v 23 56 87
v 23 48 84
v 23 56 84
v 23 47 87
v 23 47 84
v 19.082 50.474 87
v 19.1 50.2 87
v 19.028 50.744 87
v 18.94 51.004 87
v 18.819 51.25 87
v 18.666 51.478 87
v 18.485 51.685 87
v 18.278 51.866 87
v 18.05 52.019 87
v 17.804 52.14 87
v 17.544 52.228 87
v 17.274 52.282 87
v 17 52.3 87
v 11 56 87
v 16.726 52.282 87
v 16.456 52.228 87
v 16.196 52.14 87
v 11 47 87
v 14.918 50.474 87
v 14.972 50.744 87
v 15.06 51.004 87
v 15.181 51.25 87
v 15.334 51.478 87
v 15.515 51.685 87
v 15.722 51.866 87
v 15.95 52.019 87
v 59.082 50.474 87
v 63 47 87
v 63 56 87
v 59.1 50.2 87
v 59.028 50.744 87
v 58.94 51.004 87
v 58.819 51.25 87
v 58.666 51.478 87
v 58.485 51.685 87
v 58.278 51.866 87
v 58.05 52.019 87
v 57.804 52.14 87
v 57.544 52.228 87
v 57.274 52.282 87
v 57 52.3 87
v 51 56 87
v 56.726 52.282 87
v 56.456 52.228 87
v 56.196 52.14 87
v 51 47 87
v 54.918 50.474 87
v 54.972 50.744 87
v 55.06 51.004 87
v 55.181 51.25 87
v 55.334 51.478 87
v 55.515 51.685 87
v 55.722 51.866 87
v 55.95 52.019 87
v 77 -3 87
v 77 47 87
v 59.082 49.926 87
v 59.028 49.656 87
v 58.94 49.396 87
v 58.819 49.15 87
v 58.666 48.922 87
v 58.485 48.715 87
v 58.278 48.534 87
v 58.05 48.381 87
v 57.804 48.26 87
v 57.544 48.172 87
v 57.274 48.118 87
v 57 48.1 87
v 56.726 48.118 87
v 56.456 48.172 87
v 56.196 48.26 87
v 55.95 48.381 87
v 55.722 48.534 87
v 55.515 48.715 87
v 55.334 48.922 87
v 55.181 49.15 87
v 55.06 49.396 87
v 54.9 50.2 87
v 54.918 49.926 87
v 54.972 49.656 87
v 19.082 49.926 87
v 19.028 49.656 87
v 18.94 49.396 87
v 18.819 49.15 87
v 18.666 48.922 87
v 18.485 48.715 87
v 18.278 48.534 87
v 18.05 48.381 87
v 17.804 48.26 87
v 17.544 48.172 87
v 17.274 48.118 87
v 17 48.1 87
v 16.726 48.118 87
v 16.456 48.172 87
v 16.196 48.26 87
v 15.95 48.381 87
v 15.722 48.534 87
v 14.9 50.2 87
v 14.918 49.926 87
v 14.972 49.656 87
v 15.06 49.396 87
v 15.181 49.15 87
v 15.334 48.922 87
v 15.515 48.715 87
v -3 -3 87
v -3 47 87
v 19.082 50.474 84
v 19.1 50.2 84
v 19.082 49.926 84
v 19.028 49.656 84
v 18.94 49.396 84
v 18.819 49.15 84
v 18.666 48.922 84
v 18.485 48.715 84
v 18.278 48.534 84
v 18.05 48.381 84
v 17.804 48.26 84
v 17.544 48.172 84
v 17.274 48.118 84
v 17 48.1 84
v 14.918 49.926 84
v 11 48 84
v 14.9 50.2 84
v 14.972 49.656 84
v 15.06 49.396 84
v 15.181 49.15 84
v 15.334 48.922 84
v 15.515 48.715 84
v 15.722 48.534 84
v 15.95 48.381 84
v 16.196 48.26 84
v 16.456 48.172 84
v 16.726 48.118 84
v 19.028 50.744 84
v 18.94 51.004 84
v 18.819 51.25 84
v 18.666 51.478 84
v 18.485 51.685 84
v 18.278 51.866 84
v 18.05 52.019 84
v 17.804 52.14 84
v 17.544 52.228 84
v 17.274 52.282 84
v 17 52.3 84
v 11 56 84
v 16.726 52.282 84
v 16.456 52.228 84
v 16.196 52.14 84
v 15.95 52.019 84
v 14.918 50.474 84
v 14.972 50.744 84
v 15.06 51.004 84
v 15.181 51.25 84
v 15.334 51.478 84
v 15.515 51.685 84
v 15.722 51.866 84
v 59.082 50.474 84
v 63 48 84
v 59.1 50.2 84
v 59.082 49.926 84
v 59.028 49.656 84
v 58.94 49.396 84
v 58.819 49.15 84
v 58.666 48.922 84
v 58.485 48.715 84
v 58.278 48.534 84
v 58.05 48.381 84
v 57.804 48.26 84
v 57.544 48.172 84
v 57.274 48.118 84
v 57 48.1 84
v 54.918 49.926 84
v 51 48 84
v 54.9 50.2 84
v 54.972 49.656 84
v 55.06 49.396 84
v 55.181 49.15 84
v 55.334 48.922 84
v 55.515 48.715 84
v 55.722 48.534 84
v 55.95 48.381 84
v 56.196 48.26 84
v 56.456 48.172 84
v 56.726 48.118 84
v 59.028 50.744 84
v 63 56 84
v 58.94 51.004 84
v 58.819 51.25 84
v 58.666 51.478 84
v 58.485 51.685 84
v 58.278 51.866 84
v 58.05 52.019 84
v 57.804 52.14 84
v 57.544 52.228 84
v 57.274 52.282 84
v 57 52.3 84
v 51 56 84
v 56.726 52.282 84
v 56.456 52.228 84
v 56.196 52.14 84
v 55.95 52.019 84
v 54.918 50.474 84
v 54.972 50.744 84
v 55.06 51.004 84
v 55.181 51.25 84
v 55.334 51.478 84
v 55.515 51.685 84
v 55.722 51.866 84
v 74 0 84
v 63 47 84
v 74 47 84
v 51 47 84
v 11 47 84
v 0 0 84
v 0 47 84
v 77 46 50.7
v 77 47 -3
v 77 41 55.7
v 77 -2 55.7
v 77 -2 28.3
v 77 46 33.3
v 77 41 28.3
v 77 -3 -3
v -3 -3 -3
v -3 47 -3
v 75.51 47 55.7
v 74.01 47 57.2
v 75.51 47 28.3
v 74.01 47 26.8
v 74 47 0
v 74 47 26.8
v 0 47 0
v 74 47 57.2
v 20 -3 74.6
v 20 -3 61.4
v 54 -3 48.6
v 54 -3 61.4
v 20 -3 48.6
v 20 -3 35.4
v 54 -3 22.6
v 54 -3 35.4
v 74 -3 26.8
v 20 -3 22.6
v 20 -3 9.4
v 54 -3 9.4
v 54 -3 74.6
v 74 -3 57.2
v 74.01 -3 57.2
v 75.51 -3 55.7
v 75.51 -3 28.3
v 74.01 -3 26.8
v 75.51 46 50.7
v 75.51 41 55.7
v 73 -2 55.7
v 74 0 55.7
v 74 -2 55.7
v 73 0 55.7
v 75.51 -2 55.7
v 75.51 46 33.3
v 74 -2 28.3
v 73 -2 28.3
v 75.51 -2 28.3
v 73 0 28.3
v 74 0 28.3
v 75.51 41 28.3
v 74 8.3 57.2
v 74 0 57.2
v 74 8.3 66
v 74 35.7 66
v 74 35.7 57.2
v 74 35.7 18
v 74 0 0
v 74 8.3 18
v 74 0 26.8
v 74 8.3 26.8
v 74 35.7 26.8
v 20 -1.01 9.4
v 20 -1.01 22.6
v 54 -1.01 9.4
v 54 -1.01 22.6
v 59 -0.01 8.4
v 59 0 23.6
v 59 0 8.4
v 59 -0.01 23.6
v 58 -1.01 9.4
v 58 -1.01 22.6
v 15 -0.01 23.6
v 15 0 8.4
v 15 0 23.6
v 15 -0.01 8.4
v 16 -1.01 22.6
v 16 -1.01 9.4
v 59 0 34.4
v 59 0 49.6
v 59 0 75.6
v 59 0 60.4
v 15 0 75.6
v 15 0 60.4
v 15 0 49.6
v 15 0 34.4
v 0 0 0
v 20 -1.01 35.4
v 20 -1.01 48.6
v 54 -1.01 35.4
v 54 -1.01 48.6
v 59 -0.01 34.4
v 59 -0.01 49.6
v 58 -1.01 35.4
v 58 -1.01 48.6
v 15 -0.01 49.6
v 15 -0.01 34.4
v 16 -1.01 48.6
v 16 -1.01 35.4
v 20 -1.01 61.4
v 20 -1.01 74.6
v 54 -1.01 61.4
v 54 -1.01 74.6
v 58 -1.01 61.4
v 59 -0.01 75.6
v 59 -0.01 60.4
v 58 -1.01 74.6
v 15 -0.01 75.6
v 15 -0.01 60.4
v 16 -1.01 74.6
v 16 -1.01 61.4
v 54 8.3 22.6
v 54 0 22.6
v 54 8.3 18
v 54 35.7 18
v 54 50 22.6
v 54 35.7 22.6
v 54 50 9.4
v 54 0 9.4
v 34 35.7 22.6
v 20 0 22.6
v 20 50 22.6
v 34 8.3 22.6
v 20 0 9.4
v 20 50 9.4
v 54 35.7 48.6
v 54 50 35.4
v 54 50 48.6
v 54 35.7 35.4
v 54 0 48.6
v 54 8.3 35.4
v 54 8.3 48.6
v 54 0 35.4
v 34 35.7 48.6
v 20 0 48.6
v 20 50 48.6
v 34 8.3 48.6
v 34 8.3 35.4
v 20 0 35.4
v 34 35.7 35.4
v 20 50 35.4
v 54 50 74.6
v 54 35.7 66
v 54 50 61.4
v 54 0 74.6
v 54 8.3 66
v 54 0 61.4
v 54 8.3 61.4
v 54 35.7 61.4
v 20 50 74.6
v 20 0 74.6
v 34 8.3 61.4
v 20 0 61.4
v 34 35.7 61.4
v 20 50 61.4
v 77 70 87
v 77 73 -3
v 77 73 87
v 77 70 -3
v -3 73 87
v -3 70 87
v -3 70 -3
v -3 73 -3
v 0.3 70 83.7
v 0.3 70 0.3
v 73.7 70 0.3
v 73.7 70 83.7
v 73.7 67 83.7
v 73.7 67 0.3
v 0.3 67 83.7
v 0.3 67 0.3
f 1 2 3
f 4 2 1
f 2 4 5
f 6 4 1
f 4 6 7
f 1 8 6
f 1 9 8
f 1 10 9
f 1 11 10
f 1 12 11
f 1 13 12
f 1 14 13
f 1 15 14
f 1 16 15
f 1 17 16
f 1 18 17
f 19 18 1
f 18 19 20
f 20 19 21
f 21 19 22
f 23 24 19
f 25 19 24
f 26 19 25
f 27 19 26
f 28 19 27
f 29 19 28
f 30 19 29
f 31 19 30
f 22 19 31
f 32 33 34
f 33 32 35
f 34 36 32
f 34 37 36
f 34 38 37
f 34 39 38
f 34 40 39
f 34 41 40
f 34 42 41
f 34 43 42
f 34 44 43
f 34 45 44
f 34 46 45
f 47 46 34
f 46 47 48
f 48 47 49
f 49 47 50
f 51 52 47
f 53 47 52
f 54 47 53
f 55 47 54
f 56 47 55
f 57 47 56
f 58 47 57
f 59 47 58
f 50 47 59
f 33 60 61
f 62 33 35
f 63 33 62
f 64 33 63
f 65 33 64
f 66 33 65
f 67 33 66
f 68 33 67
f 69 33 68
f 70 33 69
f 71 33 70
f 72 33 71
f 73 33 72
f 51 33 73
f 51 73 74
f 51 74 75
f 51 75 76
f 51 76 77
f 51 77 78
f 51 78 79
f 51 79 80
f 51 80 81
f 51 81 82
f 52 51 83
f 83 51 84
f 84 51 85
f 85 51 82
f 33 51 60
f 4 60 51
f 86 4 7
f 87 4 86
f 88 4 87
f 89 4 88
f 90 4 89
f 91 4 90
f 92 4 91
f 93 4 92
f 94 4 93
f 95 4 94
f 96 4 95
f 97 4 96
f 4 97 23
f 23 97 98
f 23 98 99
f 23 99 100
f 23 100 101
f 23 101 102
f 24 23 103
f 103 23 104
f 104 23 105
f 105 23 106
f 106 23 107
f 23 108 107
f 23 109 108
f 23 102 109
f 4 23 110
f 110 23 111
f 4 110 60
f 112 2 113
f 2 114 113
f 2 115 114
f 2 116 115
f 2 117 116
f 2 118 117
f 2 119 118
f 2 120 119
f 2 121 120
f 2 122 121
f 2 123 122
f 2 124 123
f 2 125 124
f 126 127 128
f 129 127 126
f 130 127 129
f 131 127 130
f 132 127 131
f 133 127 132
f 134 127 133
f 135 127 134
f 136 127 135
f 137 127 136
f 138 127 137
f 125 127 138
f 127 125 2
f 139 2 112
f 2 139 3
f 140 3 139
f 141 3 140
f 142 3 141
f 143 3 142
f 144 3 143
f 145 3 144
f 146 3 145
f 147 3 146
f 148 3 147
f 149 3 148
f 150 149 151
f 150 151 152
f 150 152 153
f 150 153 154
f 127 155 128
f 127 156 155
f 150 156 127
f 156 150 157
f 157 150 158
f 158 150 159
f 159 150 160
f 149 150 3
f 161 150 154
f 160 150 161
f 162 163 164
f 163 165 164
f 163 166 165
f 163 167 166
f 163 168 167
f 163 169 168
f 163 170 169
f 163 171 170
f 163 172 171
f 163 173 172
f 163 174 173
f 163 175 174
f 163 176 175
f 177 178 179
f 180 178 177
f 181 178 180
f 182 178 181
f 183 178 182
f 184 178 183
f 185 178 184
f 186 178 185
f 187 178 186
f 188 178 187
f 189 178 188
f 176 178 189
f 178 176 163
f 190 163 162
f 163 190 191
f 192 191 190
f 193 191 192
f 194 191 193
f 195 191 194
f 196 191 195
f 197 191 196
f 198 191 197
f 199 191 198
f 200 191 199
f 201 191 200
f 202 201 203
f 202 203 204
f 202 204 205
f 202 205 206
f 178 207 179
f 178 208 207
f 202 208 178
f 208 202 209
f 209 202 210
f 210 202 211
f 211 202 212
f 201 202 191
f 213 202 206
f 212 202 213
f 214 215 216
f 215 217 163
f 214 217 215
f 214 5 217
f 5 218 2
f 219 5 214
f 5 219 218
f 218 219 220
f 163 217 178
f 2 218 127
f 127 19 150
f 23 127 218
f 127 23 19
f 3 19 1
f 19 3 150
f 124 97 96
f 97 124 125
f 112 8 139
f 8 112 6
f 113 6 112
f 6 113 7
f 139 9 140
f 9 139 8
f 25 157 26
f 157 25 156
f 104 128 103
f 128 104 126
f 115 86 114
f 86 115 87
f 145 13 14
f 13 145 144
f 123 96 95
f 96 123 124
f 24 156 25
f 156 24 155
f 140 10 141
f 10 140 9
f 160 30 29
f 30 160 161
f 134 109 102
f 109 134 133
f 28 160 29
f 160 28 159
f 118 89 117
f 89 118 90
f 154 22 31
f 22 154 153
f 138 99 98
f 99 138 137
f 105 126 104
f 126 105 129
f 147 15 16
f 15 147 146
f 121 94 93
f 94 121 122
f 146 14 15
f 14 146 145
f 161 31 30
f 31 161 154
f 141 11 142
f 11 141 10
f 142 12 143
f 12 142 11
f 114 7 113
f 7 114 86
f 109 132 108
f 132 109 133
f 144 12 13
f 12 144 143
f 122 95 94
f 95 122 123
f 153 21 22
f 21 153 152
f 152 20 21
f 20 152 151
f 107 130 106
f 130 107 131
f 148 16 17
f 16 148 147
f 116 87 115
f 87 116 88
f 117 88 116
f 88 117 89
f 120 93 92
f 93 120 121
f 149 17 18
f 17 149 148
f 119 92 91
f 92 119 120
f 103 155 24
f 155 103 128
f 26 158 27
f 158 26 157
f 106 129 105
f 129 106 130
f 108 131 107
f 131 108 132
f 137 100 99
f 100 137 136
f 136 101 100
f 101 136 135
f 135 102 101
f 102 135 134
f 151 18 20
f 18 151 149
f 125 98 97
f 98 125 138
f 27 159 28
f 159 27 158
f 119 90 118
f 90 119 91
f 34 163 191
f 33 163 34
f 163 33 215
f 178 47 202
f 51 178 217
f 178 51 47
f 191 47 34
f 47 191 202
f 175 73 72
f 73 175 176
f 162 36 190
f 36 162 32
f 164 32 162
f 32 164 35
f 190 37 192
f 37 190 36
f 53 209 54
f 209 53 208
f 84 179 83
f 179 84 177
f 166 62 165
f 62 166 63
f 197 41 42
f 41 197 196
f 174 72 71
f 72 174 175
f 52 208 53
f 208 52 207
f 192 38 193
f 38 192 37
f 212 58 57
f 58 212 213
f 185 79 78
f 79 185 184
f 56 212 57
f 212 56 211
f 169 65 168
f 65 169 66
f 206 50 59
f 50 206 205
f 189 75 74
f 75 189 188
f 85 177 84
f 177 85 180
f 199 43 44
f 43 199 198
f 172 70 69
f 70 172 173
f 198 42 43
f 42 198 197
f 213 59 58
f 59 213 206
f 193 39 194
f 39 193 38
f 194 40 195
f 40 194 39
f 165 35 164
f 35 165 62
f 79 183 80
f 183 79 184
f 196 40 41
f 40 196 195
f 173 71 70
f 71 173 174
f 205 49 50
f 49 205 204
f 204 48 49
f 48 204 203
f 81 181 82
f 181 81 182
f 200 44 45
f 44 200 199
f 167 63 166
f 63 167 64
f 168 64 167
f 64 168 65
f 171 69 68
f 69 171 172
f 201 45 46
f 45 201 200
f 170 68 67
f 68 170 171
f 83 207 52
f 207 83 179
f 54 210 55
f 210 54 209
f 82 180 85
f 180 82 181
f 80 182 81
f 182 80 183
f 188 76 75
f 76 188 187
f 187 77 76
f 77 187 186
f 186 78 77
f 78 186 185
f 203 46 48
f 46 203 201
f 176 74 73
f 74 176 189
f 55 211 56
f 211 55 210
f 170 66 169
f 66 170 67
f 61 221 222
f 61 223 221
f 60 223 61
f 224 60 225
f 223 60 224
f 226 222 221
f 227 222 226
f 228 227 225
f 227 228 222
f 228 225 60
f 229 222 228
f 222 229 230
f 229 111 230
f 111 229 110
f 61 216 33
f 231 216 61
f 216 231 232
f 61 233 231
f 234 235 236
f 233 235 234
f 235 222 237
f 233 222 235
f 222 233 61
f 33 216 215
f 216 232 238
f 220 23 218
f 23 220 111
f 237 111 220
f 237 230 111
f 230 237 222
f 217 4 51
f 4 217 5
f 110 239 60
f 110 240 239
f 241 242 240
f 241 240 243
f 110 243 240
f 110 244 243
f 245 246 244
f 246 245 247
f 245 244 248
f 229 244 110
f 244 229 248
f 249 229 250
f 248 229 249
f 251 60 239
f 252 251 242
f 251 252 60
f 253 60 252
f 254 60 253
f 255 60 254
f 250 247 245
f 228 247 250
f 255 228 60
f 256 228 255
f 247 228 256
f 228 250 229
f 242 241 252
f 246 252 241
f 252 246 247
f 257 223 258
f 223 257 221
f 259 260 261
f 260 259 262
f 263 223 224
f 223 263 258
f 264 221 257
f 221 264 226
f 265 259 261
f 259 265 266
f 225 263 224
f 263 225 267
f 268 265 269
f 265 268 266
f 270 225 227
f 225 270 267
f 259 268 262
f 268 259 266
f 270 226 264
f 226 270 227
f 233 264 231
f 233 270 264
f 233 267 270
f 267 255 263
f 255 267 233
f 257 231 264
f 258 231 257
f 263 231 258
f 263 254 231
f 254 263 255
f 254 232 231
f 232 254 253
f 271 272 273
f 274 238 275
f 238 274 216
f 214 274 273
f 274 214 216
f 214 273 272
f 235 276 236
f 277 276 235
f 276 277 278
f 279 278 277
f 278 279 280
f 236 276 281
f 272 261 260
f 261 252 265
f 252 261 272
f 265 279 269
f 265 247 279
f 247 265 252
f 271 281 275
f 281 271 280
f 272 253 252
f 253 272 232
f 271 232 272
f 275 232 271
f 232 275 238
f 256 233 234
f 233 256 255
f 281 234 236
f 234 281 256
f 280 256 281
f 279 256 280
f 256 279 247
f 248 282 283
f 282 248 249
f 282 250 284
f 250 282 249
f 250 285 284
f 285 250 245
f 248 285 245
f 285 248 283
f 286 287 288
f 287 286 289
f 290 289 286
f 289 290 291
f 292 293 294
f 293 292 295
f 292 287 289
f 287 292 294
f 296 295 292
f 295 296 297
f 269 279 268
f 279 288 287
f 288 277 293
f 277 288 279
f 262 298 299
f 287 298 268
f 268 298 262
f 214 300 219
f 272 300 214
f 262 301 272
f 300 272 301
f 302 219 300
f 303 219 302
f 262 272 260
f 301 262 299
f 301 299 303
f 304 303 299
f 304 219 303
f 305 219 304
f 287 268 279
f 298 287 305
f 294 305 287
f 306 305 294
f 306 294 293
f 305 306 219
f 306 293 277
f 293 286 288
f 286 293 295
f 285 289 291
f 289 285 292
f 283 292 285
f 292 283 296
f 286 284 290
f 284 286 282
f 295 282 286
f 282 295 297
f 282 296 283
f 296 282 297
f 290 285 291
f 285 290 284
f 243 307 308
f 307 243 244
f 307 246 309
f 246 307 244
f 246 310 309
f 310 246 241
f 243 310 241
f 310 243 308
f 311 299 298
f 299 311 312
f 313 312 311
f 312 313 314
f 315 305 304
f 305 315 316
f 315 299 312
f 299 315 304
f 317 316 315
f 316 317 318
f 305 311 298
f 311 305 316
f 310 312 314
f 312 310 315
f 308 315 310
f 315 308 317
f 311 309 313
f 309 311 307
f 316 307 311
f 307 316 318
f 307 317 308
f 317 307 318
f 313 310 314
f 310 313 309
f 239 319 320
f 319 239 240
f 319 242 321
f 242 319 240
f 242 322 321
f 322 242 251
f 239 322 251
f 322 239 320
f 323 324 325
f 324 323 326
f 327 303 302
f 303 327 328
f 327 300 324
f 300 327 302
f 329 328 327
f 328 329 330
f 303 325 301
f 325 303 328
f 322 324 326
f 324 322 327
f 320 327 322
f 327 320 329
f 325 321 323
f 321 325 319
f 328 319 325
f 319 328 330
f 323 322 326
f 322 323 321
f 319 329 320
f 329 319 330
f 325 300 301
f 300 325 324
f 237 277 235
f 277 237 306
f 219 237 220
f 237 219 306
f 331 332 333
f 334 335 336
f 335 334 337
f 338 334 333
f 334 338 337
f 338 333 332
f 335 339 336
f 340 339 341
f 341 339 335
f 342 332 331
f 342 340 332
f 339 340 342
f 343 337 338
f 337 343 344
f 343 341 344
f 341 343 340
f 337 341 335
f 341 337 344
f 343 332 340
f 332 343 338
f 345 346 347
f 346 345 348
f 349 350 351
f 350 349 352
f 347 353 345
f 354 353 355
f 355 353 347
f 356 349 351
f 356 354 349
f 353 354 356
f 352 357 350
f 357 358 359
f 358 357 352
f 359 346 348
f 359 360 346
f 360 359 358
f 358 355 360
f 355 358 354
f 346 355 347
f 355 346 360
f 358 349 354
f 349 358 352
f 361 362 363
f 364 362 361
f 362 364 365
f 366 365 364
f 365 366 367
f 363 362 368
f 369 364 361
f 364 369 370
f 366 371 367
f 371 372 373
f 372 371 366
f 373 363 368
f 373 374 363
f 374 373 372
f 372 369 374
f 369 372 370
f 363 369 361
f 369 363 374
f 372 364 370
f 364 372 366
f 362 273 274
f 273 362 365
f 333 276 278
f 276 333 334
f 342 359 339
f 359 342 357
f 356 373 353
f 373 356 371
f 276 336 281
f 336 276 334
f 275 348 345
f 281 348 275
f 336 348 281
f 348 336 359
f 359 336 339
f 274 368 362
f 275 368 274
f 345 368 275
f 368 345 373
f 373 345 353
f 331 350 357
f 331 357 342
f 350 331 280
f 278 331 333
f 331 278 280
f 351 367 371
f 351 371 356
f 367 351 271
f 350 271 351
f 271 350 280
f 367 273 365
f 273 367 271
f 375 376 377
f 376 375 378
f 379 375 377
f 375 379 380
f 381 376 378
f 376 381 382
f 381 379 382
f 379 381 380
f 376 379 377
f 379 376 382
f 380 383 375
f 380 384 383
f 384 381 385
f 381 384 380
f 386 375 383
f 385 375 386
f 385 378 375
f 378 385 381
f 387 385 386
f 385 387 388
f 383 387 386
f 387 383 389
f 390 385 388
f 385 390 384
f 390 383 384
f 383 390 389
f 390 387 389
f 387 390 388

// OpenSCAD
// file: schaltbox_parts.scad
// Mains switch box for the photo lamp -- part facts, in one place.
//
// Only the SSR is taken from a datasheet; everything else has to be measured on
// the parts actually bought, because "Euro socket" and "fuse holder" name a
// shape, not a size. Every value marked MESSEN is a placeholder that will not
// fit your parts by luck. Measure once, change here, and the whole box follows.

// --- Panasonic/Matsushita AQ2A2-ZP3 -----------------------------------------
// Verified against ds_61601_0001_en_aq1, "AC output, 2A and 3A types (Vertical)".
// Pins in one row: 1,2 = load (LAST), 3,4 = input (STEUERUNG).
ssr_body_v  = [33, 10, 25];   // vertical type, length x width x height
ssr_body_f  = [33, 25, 11];   // AQ2A2-J, the flat one
ssr_pin_d   = 0.8;
ssr_pitches = [7.62, 12.7, 5.08];  // 1->2, 2->3, 3->4; 25.4 in total
ssr_pin_len = 5.3;            // below the body

// --- Screw terminals, 5.08 mm pitch -----------------------------------------
// MESSEN: body depth and height vary by make; the width follows the pitch.
term_pitch  = 5.08;
term_depth  = 10.0;           // MESSEN: front to back on the board
term_height = 10.5;           // MESSEN: above the board
term_2p_w   = 2 * term_pitch + 2.2;   // ~12.4
term_3p_w   = 3 * term_pitch + 2.2;   // ~17.4

// --- The little board -------------------------------------------------------
// A strip of perfboard is enough: 2-pole terminal | SSR | 3-pole terminal, in a
// row, because that is the order the SSR's own pins impose.
pcb          = [70, 30, 1.6];
pcb_hole_d   = 3.2;
pcb_inset    = 4;             // hole centres from the edges
pcb_standoff = 6;             // board sits this high above the floor

// --- IEC inlet with fuse holder and switch, snap-in -------------------------
// Measured on the part. This one piece replaces what used to be three: the
// mains entry, the fuse holder and a switch. The two chamfered corners sit at
// one SHORT side -- they are the orientation key, and putting them on the long
// side would make an opening the part does not go into.
iec_cut        = [48, 27.4];  // Gesamtabmessung, Fasen eingerechnet
iec_flange     = [51, 31];    // the visible frame; only 1.45 mm wider per side,
                              // so the cutout has to be accurate and the wall flat
iec_chamfer    = 5;
iec_key_flip   = false;       // which short side carries the chamfers
// Soldering instead of push-on connectors buys depth: 29 instead of 40 for the
// inlet, 35 instead of 50 for the sockets. It also gives up something -- a
// soldered joint on a flat tab is more brittle than a crimp, and this box gets
// carried to venues. "flachstecker" is therefore the default.
connection     = "flachstecker";   // "flachstecker" | "loeten"
iec_depth      = (connection == "loeten") ? 29 : 40;
iec_snap_wall  = 1.5;         // the snaps grip a wall no thicker than this
iec_snap_edge  = "long";      // which pair of cutout edges the snaps sit on

// --- Euro sockets, snap-in --------------------------------------------------
socket_cut       = [13.2, 34];   // snaps on the narrow sides
socket_flange    = [20, 44];     // sets the box height: the frame has to sit on
                                 // the wall, not hang over its edge
// Turned flat the sockets make a wide, low box instead of a narrow, tall one.
// The plug then goes in with its pins side by side and its cable leaves
// sideways -- worth thinking about before printing.
socket_upright   = true;
socket_depth     = (connection == "loeten") ? 35 : 50;
socket_snap_wall = 2.0;
socket_gap       = 10;        // free space between two cutouts
socket_count     = 3;

// A snap-in part wants a thin panel, a mains enclosure wants a thick wall. So
// the wall stays 3 mm and is thinned only around each opening, with 45-degree
// sides: a step there would be a ceiling the printer has to bridge.
snap_margin      = 4;         // how far the thinned area reaches past the cutout

// --- Control lead ------------------------------------------------------------
// Its own hole on the other side of the rib, so 3.3 V never shares a run with
// 230 V. The mains no longer needs one: it arrives through the inlet.
ctrl_hole_d      = 7.0;

// --- The box itself ---------------------------------------------------------
// Given, not derived: the box size is the requirement, so the parts are checked
// against it instead of setting it. Layout follows the second sketch: the three
// Euro sockets sit in a column on the front (the x-z face at y = 0), the inlet
// stands upright on the right (the y-z face at x = inner). The lid is the back,
// so taking it off opens everything at once.
box = [80, 50, 90];

// The vertical SSR needs 6 + 1.6 + 25 = 32.6 mm above its floor. There is not
// that much room left over the built-in parts, so the board is optional -- see
// the fit report the file echoes when it renders.
with_pcb = false;

// The flat variant AQ2A2-J-ZP3 is 33 x 25 x 11 instead of 33 x 10 x 25.
ssr_flat = false;

// --- Print and assembly -----------------------------------------------------
// 3 mm is the floor, not a target: an FDM wall is porous along the layer lines
// and is not the insulation a moulded one of the same thickness would be.
wall        = 3.0;
floor_t     = 3.0;
lid_t       = 3.0;
clearance   = 0.3;            // printing play, per side
screw_d     = 3.0;            // lid screws, self-tapping into the bosses
screw_pilot = 2.5;
boss_d      = 8.0;
ear_hole_d  = 4.2;            // mounting into the Fotobox enclosure
ear_len     = 12;

// Mains parts must keep their distance from anything a finger can reach. The
// print is a holder, not the insulation -- sleeve the live parts as well.
creep_gap   = 8.0;
// main file
// Mains distribution box for the Fotobox, with the switch for the photo lamp.
//
// A bar of 50 x 60 x 120 mm. The underside carries the IEC inlet -- which
// brings mains, fuse and main switch in one part -- and one Euro socket, in
// line. The left side carries the other two Euro sockets, also in line. The lid
// is the long face opposite the left side, so taking it off opens the whole bar
// sideways and both groups of sockets are reachable.
//
// The box size is given, not derived. Every part is therefore checked against
// it and the file says what fits and what does not when it renders.
//
// x runs along the 120 mm length, y from the left side towards the lid, z from
// the underside upwards. Origin is the inner corner at the underside/left end.

include <schaltbox_parts.scad>

part = "beides";   // "unterteil" | "deckel" | "beides" | "explosion"
$fn = 48;

// --- derived ----------------------------------------------------------------

inner = [box[0] - 2 * wall, box[1] - 2 * wall, box[2] - 2 * wall];
ssr_body = ssr_flat ? ssr_body_f : ssr_body_v;

// Sockets sit in a column on the front: the 44 mm side of the frame runs across
// the width, the 20 mm side stacks up the height.
sock_w  = socket_cut[1];     // 34, across the width
sock_h  = socket_cut[0];     // 13.2, up the height
sfl_w   = socket_flange[1];  // 44
sfl_h   = socket_flange[0];  // 20

sock_x  = inner[0] / 2;
sock_pitch = max(sfl_h + 6, sock_h + 10);
sock_z  = [for (i = [0 : socket_count - 1])
              (inner[2] - (socket_count - 1) * sock_pitch) / 2 + i * sock_pitch];

// The inlet stands upright on the right wall: 48 mm up, 27.4 across the depth.
iec_z   = inner[2] / 2;

// What is left over beside the socket column. The frame sits outside, so what
// counts in here is the body, which has to pass through the cutout -- plus a
// couple of millimetres in case it flares behind the panel.
free_w  = (inner[0] - sock_w - 4) / 2;

pcb_x0 = (inner[0] - pcb[0]) / 2;
pcb_z0 = socket_depth + 2;          // above whatever the underside parts occupy

// --- fit report -------------------------------------------------------------
// Printed on every render. A box with a given size can only be honest about
// what does not go in.

free_behind = inner[1] - socket_depth;
pcb_stack   = pcb_standoff + pcb[2] + ssr_body[2];

echo(str("Aussen ", box[0], " x ", box[1], " x ", box[2],
         "  ->  innen ", inner[0], " x ", inner[1], " x ", inner[2]));
echo(str("Verbindung ", connection,
         ": Kaltgeraetebuchse ", iec_depth, " mm, Euro ", socket_depth, " mm"));
echo(str("Vorderseite, Dosen ragen in y (", inner[1], " frei): ",
         socket_depth <= inner[1] ? "passt" : "PASST NICHT"));
echo(str("Rechte Seite, Buchse ragt in x (", inner[0], " frei): ",
         iec_depth <= inner[0] ? "passt" : "PASST NICHT"));
echo(str("Saeule: ", socket_count, " Rahmen a ", sfl_h, " mm im Raster ", sock_pitch,
         " -> ", (socket_count - 1) * sock_pitch + sfl_h, " von ", inner[2], " mm Hoehe"));
echo(str("Platine+SSR ", pcb_stack, " mm Aufbau."));
echo(str("  neben der Saeule: ", free_w, " x ", inner[1], " x ", inner[2],
         " mm (rechts davon nimmt die Buchse ", iec_depth, ") -> ",
         pcb_stack <= free_w ? "passt stehend" : "PASST NICHT stehend"));
echo(str("  hinter den Dosen: ", free_behind, " mm -> ",
         pcb_stack <= free_behind ? "passt" : "PASST NICHT"));

// --- helpers ----------------------------------------------------------------

// The wall stays thick and is thinned only around an opening, on the two edges
// the snaps actually grip. mx/my say which. The pocket is wider at the inner
// face than at its floor: a step would be a ceiling the printer has to bridge.
module snap_pocket(w, h, mx, my, depth) {
    hull() {
        linear_extrude(0.01)
            square([w + 2 * (mx + depth), h + 2 * (my + depth)], center = true);
        translate([0, 0, depth])
            linear_extrude(0.01) square([w + 2 * mx, h + 2 * my], center = true);
    }
}

// Rectangle with two corners cut off at one SHORT side -- the inlet's key.
// w is the long dimension, so the chamfers belong on the edge of length h.
module keyed_rect(w, h, cham) {
    polygon([[-w/2,        -h/2],
             [ w/2 - cham, -h/2],
             [ w/2,        -h/2 + cham],
             [ w/2,         h/2 - cham],
             [ w/2 - cham,  h/2],
             [-w/2,         h/2]]);
}

// --- openings ---------------------------------------------------------------

// The inlet stands upright on the right wall. Snaps on its long (48 mm) edges,
// so the wall gives way above and below the opening.
module iec_opening() {
    depth = wall - iec_snap_wall;
    translate([inner[0] - 1, inner[1] / 2, iec_z])
        rotate([0, 90, 0]) linear_extrude(wall + 2)
            rotate([0, 0, 90]) keyed_rect(iec_cut[0], iec_cut[1], iec_chamfer);
    translate([inner[0], inner[1] / 2, iec_z])
        rotate([0, 90, 0]) snap_pocket(iec_cut[1], iec_cut[0], 0, snap_margin, depth);
}

// Three sockets in a column on the front. Snaps on their narrow (13.2 mm)
// edges, which now run across the width -- so the wall gives way sideways.
module front_openings() {
    depth = wall - socket_snap_wall;
    for (cz = sock_z) {
        translate([sock_x, -wall - 1, cz])
            rotate([-90, 0, 0]) linear_extrude(wall + 2)
                square([sock_w, sock_h], center = true);
        translate([sock_x, 0, cz])
            rotate([90, 0, 0]) snap_pocket(sock_w, sock_h, snap_margin, 0, depth);
    }
}

module control_opening() {
    // Only needed while the board lives in here.
    if (with_pcb)
        translate([-wall - 1, inner[1] / 2, inner[2] * 0.85])
            rotate([0, 90, 0]) cylinder(d = ctrl_hole_d, h = wall + 2);
}

// --- parts ------------------------------------------------------------------

module unterteil() {
    difference() {
        union() {
            translate([-wall, -wall, -wall]) cube([box[0], box[1], box[2]]);
            mounting_ears();
        }
        // open towards +y, that face is the lid
        translate([0, 0, 0]) cube([inner[0], inner[1] + wall + 1, inner[2]]);
        iec_opening();
        front_openings();
        control_opening();
        lid_screw_holes();
    }
    if (with_pcb) pcb_standoffs();
}

module lid_screw_positions() {
    for (x = [8, inner[0] - 8])
        for (z = [8, inner[2] - 8])
            translate([x, inner[1], z]) children();
}

module lid_screw_holes() {
    lid_screw_positions()
        rotate([-90, 0, 0]) translate([0, 0, -14]) cylinder(d = screw_pilot, h = 15);
}

module pcb_standoffs() {
    for (dx = [pcb_inset, pcb[0] - pcb_inset])
        for (dy = [pcb_inset, pcb[1] - pcb_inset])
            translate([pcb_x0 + dx, dy + 4, pcb_z0 - pcb_standoff])
                difference() {
                    cylinder(d = boss_d, h = pcb_standoff);
                    translate([0, 0, 2]) cylinder(d = screw_pilot, h = pcb_standoff);
                }
}

module mounting_ears() {
    // On the top face, so the bar can be screwed up into the Fotobox.
    for (x = [box[0] * 0.25, box[0] * 0.75])
        translate([x - wall, inner[1] - 1, inner[2]])
            difference() {
                translate([-ear_len / 2, 0, 0]) cube([ear_len, ear_len + 1, wall]);
                translate([0, ear_len * 0.6, -1]) cylinder(d = ear_hole_d, h = wall + 2);
            }
}

module deckel() {
    difference() {
        union() {
            translate([-wall, 0, -wall]) cube([box[0], lid_t, box[2]]);
            translate([clearance, -3, clearance])
                cube([inner[0] - 2 * clearance, 3, inner[2] - 2 * clearance]);
        }
        lid_screw_positions()
            rotate([-90, 0, 0]) translate([0, 0, -4]) cylinder(d = screw_d + 0.4, h = lid_t + 6);
        lid_screw_positions()
            rotate([-90, 0, 0]) translate([0, 0, lid_t - 1.8]) cylinder(d = screw_d * 2, h = 2);
    }
}

// --- what goes inside -------------------------------------------------------

module fitting_dummies() {
    color("gray")
        translate([inner[0] - iec_depth, (inner[1] - iec_cut[1]) / 2, iec_z - iec_cut[0] / 2])
            cube([iec_depth, iec_cut[1], iec_cut[0]]);
    for (cz = sock_z)
        color("silver")
            translate([sock_x - sock_w / 2, 0, cz - sock_h / 2])
                cube([sock_w, socket_depth, sock_h]);
}

module pcb_dummy() {
    if (with_pcb) {
        color("darkgreen") translate([pcb_x0, 4, pcb_z0]) cube(pcb);
        color("dimgray")
            translate([pcb_x0 + term_2p_w + 4, 4 + (pcb[1] - ssr_body[1]) / 2,
                       pcb_z0 + pcb[2]]) cube(ssr_body);
    }
}

if (part == "unterteil") unterteil();
else if (part == "deckel") deckel();
else if (part == "explosion") {
    unterteil(); fitting_dummies(); pcb_dummy();
    translate([0, 40, 0]) deckel();
} else {
    unterteil(); fitting_dummies(); pcb_dummy();
    translate([0, box[1] + 20, 0]) deckel();
}
